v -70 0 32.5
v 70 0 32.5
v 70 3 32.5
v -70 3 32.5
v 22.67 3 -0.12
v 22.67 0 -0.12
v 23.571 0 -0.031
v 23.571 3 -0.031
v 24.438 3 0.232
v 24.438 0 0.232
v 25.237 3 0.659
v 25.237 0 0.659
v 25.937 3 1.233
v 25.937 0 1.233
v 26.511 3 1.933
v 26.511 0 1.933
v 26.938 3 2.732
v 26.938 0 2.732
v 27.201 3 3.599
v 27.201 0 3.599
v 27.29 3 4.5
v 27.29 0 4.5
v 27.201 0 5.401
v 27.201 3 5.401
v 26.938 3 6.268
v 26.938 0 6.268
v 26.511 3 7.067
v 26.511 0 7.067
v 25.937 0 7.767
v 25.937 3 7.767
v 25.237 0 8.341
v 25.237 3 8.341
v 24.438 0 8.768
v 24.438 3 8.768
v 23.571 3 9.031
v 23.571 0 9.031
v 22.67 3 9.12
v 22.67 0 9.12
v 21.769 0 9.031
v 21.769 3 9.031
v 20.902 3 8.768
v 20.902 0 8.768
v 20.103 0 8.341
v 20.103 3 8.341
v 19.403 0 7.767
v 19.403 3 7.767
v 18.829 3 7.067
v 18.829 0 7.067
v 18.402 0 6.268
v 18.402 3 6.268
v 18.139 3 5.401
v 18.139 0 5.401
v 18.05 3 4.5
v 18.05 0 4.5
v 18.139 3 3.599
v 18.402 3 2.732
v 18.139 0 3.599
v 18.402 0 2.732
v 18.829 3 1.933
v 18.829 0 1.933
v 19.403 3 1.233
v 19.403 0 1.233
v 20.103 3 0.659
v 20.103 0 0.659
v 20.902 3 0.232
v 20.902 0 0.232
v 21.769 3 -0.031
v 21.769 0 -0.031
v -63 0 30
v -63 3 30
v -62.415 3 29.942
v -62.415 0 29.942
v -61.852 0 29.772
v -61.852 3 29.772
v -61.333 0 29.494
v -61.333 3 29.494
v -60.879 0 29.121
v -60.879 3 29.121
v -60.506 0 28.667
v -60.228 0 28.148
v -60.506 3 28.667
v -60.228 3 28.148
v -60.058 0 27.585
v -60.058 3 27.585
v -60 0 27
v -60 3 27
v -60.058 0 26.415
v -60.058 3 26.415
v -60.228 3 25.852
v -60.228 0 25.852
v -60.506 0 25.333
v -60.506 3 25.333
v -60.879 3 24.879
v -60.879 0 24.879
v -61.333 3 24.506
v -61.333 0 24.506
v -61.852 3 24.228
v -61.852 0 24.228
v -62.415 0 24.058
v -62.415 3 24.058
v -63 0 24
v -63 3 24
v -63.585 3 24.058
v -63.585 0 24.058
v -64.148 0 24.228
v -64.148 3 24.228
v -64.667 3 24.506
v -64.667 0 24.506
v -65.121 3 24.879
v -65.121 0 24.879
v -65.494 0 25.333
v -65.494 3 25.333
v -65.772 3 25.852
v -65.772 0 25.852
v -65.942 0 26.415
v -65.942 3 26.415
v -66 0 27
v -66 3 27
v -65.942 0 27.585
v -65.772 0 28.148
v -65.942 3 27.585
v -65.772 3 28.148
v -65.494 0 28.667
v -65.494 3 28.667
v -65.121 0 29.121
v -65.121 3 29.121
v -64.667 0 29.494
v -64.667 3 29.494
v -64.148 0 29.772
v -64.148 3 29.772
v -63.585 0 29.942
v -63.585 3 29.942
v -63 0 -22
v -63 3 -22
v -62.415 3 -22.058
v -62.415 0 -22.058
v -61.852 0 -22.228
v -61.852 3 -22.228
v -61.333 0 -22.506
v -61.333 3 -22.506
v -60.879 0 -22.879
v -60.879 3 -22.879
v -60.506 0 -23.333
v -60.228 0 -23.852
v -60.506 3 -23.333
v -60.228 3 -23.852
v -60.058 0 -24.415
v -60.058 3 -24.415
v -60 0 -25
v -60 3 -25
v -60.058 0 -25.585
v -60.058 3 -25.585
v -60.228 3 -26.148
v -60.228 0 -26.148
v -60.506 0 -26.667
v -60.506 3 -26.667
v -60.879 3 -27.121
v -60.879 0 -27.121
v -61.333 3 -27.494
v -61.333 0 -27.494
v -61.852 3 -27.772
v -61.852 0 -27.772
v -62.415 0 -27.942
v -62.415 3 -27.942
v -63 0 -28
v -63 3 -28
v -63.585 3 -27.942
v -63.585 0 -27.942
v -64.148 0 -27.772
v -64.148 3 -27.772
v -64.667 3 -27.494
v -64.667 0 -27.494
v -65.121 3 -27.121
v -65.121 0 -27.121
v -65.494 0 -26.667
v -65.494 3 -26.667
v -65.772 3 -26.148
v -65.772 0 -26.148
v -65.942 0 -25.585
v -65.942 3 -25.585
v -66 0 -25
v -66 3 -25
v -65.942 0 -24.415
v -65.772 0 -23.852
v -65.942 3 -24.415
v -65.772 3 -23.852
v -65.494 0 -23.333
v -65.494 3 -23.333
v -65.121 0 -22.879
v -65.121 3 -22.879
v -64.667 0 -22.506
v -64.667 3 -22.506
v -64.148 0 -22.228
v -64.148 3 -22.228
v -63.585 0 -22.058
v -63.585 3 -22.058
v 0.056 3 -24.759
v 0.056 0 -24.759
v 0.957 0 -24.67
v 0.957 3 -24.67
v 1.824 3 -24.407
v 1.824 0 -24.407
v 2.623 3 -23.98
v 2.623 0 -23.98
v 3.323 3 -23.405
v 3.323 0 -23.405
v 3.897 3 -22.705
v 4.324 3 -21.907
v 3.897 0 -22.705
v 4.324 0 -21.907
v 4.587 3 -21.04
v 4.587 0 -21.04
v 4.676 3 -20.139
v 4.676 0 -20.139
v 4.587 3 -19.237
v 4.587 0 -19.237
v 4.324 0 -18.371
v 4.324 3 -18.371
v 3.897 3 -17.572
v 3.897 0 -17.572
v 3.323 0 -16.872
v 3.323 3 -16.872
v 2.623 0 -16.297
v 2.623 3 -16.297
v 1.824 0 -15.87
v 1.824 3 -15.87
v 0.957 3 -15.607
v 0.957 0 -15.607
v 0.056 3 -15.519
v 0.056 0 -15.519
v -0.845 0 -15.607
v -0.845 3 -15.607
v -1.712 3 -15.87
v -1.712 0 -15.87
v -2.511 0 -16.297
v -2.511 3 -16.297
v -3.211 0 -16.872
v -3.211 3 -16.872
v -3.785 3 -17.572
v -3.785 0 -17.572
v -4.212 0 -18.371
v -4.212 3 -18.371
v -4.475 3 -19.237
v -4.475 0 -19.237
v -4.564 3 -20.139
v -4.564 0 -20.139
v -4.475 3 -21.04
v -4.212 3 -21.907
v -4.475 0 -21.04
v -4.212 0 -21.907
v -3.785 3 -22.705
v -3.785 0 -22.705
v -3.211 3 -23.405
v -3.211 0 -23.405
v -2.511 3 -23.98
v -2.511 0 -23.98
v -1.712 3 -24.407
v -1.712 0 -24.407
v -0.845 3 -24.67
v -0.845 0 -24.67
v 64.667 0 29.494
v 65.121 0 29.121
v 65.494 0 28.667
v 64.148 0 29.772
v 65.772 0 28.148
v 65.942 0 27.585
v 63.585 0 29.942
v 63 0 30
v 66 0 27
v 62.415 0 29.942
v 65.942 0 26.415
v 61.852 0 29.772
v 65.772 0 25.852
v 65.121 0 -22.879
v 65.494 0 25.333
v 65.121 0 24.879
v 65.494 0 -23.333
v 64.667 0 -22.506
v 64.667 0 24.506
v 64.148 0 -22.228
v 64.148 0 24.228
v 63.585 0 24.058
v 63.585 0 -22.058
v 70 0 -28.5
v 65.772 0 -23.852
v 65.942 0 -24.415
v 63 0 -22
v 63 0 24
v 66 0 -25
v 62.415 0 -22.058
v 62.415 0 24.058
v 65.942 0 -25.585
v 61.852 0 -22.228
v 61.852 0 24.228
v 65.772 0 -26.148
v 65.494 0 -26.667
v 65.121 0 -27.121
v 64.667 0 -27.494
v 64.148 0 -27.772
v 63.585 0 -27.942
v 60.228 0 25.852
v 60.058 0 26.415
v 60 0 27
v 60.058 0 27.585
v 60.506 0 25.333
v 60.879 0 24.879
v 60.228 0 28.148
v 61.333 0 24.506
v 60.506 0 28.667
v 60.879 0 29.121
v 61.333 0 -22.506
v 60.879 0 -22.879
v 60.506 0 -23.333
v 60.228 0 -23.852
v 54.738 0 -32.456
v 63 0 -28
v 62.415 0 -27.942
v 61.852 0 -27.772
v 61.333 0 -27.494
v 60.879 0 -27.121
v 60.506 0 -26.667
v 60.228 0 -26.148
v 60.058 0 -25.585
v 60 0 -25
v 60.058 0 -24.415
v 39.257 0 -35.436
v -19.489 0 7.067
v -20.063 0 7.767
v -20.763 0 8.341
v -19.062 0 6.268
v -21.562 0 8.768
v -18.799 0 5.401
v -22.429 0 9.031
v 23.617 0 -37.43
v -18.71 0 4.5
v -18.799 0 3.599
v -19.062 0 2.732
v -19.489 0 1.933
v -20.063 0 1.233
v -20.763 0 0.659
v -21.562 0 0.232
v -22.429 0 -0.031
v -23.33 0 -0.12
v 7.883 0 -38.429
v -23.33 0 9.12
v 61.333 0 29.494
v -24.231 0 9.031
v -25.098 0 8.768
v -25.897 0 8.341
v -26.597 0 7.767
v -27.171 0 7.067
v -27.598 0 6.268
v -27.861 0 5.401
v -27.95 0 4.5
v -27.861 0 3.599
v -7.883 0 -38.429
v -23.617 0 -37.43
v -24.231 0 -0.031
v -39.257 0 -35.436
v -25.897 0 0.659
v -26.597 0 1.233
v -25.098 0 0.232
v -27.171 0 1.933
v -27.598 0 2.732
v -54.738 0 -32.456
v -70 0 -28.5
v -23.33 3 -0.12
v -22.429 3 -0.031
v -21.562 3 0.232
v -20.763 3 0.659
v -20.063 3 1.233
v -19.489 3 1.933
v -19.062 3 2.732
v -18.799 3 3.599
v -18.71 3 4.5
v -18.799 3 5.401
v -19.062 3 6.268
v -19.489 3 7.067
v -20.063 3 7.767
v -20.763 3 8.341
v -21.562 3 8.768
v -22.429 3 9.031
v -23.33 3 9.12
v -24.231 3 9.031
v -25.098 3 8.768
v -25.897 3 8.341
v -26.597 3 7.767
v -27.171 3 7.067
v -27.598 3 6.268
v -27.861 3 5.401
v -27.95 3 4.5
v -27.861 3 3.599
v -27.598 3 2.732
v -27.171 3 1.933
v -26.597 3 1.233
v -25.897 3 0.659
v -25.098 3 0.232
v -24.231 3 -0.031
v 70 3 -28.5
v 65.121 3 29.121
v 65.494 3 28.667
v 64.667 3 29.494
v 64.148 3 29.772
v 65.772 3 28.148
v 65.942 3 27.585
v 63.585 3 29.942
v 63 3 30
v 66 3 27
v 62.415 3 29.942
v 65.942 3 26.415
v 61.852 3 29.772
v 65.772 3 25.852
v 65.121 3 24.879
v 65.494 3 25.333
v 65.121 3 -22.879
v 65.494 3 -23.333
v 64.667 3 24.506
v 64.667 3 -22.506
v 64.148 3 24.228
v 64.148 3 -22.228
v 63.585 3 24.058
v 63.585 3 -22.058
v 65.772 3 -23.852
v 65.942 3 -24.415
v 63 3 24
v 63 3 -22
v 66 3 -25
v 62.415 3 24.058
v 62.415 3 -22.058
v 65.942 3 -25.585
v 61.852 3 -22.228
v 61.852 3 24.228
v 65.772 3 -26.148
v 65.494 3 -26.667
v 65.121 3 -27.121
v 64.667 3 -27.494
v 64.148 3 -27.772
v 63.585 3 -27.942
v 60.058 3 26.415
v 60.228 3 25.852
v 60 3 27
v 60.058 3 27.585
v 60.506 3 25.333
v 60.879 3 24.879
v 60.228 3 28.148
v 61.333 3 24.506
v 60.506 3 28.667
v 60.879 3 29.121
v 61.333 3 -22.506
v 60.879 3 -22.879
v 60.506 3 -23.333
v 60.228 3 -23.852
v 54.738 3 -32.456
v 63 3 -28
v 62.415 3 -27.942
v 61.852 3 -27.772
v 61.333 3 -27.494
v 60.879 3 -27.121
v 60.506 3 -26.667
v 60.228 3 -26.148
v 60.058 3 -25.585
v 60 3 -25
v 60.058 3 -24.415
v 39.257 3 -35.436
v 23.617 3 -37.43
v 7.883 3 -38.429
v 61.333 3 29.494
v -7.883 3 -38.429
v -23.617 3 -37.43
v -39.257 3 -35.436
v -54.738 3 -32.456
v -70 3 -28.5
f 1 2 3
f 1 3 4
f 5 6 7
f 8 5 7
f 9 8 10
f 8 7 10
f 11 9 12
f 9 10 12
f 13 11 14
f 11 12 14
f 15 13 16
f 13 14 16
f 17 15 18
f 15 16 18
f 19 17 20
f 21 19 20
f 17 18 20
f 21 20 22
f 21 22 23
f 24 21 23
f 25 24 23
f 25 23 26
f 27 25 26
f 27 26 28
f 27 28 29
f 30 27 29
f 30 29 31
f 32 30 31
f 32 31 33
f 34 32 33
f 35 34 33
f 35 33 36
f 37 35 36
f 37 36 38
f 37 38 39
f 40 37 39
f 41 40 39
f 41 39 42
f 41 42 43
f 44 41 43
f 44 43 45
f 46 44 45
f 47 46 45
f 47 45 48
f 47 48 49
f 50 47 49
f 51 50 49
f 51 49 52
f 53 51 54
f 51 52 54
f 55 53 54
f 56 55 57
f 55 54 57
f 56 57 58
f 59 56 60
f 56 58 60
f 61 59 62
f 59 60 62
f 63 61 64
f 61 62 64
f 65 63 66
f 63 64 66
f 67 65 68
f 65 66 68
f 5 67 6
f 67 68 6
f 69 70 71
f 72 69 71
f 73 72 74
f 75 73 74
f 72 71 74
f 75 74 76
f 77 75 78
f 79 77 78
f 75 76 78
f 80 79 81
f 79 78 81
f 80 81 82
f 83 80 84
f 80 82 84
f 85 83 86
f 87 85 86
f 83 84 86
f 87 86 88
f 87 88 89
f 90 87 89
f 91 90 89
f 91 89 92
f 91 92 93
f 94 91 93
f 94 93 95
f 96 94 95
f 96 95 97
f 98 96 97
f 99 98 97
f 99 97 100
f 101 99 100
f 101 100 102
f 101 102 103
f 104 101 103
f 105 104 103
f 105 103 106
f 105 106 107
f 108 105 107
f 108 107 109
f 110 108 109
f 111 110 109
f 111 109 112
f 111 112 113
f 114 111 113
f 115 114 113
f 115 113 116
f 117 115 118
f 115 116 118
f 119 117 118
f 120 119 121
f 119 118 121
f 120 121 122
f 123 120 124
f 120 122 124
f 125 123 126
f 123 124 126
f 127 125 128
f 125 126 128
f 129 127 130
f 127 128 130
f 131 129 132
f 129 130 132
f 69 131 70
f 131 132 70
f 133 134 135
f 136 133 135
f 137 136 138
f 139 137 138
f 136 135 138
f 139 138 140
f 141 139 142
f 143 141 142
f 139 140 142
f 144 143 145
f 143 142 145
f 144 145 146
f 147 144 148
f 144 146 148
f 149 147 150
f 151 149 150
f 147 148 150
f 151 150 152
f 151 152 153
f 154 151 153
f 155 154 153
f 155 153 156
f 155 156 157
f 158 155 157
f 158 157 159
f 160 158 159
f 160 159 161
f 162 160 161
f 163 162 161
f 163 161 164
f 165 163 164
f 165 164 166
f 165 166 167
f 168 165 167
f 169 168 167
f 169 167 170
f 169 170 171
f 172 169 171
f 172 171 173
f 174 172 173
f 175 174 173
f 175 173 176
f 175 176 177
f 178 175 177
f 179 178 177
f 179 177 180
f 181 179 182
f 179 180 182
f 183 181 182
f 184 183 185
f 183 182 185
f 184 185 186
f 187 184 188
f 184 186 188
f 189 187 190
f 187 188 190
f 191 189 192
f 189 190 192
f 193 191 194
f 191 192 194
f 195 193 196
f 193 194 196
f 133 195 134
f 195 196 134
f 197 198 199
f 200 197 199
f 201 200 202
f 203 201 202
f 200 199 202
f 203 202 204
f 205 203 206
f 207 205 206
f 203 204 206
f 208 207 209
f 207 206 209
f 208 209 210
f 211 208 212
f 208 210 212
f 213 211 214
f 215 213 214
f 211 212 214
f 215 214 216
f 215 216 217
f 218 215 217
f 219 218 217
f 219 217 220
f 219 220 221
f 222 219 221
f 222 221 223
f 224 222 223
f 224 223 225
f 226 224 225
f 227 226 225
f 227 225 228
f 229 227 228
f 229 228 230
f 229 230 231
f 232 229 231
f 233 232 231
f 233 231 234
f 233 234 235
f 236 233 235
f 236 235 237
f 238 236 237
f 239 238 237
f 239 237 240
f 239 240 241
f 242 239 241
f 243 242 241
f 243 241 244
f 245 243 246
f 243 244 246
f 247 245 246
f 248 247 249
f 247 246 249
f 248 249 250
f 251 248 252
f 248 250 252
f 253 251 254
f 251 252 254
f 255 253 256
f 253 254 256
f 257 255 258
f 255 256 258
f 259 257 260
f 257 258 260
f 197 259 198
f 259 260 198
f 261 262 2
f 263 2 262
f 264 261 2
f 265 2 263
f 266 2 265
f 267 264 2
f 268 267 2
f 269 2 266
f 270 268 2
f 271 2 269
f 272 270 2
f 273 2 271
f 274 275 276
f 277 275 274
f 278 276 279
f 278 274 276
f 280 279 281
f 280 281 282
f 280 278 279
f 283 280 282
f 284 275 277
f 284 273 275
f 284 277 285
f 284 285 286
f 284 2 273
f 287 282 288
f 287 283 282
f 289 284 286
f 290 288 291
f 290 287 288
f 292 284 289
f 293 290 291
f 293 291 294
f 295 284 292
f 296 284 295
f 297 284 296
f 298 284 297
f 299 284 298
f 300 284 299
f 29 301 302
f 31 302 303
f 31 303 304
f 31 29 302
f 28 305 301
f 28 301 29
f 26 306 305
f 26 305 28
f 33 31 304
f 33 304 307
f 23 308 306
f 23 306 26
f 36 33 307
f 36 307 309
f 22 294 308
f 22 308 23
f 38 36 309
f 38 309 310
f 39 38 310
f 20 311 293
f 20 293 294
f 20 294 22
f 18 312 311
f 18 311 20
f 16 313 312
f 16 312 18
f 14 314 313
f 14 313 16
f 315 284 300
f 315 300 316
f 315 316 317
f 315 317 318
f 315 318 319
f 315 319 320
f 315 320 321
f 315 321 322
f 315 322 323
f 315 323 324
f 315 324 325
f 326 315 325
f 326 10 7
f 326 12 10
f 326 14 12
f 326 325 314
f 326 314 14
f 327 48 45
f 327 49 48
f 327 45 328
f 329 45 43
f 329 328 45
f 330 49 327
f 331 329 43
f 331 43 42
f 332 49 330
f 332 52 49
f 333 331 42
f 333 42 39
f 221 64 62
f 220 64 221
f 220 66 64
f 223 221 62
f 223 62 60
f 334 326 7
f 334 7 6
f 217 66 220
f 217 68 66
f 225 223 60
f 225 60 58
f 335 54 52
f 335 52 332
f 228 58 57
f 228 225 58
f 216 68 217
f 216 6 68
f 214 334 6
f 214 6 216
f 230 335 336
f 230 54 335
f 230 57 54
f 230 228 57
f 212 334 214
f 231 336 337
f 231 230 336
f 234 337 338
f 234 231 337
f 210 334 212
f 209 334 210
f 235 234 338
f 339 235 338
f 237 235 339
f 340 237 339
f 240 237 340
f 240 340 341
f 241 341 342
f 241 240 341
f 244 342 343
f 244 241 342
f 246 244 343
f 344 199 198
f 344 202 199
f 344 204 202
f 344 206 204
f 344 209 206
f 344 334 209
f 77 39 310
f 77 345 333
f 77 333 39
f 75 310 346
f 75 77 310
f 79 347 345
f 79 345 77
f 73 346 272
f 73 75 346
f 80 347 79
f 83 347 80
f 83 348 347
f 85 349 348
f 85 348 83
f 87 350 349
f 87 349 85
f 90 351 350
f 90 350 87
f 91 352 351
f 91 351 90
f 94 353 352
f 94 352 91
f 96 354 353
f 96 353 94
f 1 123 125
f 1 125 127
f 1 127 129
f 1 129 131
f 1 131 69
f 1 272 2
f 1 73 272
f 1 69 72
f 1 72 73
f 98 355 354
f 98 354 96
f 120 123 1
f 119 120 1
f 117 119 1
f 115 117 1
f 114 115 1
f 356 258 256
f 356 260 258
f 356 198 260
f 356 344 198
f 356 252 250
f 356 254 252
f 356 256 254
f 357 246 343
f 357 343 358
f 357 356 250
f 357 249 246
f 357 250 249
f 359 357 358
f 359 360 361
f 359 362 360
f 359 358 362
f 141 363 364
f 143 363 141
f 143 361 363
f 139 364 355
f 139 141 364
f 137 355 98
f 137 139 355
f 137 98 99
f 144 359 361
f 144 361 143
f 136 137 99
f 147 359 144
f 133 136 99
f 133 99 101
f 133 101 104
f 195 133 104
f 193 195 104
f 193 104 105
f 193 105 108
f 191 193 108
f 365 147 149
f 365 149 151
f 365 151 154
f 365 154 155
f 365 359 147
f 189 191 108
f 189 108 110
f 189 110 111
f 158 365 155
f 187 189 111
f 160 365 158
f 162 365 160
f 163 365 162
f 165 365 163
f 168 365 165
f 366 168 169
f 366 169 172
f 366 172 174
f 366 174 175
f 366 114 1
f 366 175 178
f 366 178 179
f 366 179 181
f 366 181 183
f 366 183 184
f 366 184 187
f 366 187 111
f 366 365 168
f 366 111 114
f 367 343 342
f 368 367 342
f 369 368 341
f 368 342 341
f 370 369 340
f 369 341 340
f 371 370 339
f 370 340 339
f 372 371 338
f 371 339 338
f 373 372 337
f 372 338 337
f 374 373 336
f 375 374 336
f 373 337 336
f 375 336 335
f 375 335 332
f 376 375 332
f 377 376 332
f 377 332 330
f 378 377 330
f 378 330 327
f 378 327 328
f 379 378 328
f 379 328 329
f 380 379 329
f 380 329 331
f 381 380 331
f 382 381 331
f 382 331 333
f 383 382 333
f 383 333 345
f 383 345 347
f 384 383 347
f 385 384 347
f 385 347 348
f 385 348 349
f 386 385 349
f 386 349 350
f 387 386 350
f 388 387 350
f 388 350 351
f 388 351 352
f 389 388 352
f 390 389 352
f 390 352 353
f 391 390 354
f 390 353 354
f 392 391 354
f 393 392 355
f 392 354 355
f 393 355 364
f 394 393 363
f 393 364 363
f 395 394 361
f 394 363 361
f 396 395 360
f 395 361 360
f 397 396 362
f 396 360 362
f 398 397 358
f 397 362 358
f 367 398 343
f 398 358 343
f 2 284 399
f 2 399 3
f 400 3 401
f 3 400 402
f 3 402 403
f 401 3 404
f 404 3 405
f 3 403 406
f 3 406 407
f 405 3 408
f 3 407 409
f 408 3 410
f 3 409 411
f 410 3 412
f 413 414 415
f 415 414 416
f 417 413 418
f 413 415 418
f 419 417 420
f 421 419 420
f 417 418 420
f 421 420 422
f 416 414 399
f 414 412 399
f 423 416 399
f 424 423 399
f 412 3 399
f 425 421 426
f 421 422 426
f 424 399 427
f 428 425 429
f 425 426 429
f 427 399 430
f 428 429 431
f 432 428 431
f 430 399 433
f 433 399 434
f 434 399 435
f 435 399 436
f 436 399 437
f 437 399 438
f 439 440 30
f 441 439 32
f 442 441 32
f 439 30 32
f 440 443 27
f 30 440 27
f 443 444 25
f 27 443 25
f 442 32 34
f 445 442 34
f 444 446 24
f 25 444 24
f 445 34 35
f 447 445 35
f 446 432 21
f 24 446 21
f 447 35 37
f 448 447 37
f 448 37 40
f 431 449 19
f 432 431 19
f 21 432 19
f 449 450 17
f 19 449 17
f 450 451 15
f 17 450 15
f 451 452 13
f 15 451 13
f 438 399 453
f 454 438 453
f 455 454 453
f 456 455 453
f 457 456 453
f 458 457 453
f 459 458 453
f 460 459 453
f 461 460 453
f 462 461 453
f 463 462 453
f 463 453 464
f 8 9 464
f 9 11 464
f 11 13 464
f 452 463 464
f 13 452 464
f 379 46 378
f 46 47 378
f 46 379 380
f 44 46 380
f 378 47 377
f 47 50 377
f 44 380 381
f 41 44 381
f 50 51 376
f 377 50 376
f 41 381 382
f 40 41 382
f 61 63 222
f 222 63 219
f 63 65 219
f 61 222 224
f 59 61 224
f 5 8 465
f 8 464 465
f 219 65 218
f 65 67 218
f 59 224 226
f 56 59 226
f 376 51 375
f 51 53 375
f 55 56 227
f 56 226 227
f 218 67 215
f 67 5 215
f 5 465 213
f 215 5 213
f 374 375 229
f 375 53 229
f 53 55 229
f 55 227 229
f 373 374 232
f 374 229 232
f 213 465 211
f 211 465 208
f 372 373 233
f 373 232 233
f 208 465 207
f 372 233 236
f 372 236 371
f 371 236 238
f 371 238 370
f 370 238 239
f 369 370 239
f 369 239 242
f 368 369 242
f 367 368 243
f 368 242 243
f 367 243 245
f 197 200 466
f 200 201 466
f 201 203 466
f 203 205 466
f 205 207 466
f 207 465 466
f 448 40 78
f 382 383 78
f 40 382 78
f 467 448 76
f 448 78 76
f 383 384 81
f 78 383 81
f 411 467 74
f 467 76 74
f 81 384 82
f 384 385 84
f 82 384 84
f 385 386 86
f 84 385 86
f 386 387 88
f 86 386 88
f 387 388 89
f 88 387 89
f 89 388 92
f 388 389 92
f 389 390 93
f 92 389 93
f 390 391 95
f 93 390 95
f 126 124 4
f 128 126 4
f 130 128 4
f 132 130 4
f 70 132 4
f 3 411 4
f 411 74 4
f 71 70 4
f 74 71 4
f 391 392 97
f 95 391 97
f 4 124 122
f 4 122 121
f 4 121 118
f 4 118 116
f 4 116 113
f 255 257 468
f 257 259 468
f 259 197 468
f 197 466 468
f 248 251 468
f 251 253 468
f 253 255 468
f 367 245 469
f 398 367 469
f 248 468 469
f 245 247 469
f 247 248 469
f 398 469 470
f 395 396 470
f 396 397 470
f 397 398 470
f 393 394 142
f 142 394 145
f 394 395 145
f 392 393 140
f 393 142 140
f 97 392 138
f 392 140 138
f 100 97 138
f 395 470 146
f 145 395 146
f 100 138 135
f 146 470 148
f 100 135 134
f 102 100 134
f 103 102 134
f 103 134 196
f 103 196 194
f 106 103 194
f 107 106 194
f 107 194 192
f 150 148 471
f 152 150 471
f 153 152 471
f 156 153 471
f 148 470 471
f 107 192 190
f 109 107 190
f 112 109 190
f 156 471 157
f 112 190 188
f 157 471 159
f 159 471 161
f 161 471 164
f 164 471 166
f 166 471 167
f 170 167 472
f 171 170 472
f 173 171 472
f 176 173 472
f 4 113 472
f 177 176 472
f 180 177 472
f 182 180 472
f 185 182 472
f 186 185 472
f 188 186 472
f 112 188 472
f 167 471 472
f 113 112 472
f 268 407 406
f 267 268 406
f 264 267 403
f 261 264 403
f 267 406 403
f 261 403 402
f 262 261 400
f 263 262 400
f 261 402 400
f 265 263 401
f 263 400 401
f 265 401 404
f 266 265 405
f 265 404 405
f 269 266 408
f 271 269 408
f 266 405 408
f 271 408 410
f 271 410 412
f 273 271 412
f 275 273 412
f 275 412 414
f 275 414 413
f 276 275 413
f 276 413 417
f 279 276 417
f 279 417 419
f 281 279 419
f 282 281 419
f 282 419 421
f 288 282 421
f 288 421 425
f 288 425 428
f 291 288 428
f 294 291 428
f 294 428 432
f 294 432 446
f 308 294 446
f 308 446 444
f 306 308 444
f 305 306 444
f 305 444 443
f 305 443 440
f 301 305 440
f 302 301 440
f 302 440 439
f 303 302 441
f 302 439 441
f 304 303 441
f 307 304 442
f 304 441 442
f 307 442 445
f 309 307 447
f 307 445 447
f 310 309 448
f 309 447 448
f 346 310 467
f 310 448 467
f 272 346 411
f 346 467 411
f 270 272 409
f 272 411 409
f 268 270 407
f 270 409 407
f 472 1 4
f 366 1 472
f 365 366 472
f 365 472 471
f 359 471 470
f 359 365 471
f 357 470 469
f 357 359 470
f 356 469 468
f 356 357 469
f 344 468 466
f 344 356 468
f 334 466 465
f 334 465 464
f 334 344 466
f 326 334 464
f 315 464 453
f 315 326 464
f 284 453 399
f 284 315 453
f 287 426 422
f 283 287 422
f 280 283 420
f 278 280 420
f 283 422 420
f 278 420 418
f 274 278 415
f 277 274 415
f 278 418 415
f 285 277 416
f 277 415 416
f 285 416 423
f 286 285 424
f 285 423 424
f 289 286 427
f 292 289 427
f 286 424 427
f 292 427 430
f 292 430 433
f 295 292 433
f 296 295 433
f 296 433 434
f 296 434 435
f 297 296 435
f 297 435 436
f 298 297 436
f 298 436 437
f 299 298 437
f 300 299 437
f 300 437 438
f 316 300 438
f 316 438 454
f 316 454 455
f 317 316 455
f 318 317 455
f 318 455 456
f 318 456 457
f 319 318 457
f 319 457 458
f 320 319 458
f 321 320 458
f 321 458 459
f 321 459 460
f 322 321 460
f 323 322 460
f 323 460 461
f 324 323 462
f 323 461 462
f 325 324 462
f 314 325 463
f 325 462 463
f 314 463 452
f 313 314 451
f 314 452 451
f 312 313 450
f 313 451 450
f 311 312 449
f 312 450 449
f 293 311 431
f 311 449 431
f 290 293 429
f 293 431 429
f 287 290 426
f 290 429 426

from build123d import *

# Parameters (mm, degrees)
BOSS_EXTRUDE1_DEPTH = 3
SKETCH3_R           = 3
CUT_EXTRUDE1_DEPTH  = 10
SKETCH4_R           = 4.62
CUT_EXTRUDE2_DEPTH  = 10


with BuildPart() as part:
    # Sketch1 → Boss-Extrude1 (new body)
    with BuildSketch(Plane(origin=(0, 0, 0), x_dir=(1, 0, 0), z_dir=(0, 1, 0))):
        with BuildLine():
            Line((70, 28.5), (70, -32.5))
            Line((70, -32.5), (-70, -32.5))
            Line((-70, -32.5), (-70, 28.5))
            ThreePointArc((-70, 28.5), (0, 38.554020598), (70, 28.5))
        make_face()
    extrude(amount=BOSS_EXTRUDE1_DEPTH)

    # Sketch3 → Cut-Extrude1 (cut)
    with BuildSketch(Plane(origin=(0, 3, 0), x_dir=(1, 0, 0), z_dir=(0, 1, 0))):
        with Locations(Location((-63, 25, 0), (0, 0, 270))):
            Circle(SKETCH3_R)
        with Locations(Location((-63, -27, 0), (0, 0, 270))):
            Circle(SKETCH3_R)
        with Locations(Location((63, 25, 0), (0, 0, 270))):
            Circle(SKETCH3_R)
        with Locations(Location((63, -27, 0), (0, 0, 270))):
            Circle(SKETCH3_R)
    extrude(amount=-CUT_EXTRUDE1_DEPTH, mode=Mode.SUBTRACT)

    # Sketch4 → Cut-Extrude2 (cut)
    with BuildSketch(Plane(origin=(0, 0, 0), x_dir=(-1, 0, 0), z_dir=(0, -1, 0))):
        with Locations(Location((23.33, -4.5, 0), (0, 0, 90))):
            Circle(SKETCH4_R)
        with Locations(Location((-22.67, -4.5, 0), (0, 0, 90))):
            Circle(SKETCH4_R)
        with Locations(Location((-0.055991236, 20.138512818, 0), (0, 0, 90))):
            Circle(SKETCH4_R)
    extrude(amount=-CUT_EXTRUDE2_DEPTH, mode=Mode.SUBTRACT)


solid = part.part
